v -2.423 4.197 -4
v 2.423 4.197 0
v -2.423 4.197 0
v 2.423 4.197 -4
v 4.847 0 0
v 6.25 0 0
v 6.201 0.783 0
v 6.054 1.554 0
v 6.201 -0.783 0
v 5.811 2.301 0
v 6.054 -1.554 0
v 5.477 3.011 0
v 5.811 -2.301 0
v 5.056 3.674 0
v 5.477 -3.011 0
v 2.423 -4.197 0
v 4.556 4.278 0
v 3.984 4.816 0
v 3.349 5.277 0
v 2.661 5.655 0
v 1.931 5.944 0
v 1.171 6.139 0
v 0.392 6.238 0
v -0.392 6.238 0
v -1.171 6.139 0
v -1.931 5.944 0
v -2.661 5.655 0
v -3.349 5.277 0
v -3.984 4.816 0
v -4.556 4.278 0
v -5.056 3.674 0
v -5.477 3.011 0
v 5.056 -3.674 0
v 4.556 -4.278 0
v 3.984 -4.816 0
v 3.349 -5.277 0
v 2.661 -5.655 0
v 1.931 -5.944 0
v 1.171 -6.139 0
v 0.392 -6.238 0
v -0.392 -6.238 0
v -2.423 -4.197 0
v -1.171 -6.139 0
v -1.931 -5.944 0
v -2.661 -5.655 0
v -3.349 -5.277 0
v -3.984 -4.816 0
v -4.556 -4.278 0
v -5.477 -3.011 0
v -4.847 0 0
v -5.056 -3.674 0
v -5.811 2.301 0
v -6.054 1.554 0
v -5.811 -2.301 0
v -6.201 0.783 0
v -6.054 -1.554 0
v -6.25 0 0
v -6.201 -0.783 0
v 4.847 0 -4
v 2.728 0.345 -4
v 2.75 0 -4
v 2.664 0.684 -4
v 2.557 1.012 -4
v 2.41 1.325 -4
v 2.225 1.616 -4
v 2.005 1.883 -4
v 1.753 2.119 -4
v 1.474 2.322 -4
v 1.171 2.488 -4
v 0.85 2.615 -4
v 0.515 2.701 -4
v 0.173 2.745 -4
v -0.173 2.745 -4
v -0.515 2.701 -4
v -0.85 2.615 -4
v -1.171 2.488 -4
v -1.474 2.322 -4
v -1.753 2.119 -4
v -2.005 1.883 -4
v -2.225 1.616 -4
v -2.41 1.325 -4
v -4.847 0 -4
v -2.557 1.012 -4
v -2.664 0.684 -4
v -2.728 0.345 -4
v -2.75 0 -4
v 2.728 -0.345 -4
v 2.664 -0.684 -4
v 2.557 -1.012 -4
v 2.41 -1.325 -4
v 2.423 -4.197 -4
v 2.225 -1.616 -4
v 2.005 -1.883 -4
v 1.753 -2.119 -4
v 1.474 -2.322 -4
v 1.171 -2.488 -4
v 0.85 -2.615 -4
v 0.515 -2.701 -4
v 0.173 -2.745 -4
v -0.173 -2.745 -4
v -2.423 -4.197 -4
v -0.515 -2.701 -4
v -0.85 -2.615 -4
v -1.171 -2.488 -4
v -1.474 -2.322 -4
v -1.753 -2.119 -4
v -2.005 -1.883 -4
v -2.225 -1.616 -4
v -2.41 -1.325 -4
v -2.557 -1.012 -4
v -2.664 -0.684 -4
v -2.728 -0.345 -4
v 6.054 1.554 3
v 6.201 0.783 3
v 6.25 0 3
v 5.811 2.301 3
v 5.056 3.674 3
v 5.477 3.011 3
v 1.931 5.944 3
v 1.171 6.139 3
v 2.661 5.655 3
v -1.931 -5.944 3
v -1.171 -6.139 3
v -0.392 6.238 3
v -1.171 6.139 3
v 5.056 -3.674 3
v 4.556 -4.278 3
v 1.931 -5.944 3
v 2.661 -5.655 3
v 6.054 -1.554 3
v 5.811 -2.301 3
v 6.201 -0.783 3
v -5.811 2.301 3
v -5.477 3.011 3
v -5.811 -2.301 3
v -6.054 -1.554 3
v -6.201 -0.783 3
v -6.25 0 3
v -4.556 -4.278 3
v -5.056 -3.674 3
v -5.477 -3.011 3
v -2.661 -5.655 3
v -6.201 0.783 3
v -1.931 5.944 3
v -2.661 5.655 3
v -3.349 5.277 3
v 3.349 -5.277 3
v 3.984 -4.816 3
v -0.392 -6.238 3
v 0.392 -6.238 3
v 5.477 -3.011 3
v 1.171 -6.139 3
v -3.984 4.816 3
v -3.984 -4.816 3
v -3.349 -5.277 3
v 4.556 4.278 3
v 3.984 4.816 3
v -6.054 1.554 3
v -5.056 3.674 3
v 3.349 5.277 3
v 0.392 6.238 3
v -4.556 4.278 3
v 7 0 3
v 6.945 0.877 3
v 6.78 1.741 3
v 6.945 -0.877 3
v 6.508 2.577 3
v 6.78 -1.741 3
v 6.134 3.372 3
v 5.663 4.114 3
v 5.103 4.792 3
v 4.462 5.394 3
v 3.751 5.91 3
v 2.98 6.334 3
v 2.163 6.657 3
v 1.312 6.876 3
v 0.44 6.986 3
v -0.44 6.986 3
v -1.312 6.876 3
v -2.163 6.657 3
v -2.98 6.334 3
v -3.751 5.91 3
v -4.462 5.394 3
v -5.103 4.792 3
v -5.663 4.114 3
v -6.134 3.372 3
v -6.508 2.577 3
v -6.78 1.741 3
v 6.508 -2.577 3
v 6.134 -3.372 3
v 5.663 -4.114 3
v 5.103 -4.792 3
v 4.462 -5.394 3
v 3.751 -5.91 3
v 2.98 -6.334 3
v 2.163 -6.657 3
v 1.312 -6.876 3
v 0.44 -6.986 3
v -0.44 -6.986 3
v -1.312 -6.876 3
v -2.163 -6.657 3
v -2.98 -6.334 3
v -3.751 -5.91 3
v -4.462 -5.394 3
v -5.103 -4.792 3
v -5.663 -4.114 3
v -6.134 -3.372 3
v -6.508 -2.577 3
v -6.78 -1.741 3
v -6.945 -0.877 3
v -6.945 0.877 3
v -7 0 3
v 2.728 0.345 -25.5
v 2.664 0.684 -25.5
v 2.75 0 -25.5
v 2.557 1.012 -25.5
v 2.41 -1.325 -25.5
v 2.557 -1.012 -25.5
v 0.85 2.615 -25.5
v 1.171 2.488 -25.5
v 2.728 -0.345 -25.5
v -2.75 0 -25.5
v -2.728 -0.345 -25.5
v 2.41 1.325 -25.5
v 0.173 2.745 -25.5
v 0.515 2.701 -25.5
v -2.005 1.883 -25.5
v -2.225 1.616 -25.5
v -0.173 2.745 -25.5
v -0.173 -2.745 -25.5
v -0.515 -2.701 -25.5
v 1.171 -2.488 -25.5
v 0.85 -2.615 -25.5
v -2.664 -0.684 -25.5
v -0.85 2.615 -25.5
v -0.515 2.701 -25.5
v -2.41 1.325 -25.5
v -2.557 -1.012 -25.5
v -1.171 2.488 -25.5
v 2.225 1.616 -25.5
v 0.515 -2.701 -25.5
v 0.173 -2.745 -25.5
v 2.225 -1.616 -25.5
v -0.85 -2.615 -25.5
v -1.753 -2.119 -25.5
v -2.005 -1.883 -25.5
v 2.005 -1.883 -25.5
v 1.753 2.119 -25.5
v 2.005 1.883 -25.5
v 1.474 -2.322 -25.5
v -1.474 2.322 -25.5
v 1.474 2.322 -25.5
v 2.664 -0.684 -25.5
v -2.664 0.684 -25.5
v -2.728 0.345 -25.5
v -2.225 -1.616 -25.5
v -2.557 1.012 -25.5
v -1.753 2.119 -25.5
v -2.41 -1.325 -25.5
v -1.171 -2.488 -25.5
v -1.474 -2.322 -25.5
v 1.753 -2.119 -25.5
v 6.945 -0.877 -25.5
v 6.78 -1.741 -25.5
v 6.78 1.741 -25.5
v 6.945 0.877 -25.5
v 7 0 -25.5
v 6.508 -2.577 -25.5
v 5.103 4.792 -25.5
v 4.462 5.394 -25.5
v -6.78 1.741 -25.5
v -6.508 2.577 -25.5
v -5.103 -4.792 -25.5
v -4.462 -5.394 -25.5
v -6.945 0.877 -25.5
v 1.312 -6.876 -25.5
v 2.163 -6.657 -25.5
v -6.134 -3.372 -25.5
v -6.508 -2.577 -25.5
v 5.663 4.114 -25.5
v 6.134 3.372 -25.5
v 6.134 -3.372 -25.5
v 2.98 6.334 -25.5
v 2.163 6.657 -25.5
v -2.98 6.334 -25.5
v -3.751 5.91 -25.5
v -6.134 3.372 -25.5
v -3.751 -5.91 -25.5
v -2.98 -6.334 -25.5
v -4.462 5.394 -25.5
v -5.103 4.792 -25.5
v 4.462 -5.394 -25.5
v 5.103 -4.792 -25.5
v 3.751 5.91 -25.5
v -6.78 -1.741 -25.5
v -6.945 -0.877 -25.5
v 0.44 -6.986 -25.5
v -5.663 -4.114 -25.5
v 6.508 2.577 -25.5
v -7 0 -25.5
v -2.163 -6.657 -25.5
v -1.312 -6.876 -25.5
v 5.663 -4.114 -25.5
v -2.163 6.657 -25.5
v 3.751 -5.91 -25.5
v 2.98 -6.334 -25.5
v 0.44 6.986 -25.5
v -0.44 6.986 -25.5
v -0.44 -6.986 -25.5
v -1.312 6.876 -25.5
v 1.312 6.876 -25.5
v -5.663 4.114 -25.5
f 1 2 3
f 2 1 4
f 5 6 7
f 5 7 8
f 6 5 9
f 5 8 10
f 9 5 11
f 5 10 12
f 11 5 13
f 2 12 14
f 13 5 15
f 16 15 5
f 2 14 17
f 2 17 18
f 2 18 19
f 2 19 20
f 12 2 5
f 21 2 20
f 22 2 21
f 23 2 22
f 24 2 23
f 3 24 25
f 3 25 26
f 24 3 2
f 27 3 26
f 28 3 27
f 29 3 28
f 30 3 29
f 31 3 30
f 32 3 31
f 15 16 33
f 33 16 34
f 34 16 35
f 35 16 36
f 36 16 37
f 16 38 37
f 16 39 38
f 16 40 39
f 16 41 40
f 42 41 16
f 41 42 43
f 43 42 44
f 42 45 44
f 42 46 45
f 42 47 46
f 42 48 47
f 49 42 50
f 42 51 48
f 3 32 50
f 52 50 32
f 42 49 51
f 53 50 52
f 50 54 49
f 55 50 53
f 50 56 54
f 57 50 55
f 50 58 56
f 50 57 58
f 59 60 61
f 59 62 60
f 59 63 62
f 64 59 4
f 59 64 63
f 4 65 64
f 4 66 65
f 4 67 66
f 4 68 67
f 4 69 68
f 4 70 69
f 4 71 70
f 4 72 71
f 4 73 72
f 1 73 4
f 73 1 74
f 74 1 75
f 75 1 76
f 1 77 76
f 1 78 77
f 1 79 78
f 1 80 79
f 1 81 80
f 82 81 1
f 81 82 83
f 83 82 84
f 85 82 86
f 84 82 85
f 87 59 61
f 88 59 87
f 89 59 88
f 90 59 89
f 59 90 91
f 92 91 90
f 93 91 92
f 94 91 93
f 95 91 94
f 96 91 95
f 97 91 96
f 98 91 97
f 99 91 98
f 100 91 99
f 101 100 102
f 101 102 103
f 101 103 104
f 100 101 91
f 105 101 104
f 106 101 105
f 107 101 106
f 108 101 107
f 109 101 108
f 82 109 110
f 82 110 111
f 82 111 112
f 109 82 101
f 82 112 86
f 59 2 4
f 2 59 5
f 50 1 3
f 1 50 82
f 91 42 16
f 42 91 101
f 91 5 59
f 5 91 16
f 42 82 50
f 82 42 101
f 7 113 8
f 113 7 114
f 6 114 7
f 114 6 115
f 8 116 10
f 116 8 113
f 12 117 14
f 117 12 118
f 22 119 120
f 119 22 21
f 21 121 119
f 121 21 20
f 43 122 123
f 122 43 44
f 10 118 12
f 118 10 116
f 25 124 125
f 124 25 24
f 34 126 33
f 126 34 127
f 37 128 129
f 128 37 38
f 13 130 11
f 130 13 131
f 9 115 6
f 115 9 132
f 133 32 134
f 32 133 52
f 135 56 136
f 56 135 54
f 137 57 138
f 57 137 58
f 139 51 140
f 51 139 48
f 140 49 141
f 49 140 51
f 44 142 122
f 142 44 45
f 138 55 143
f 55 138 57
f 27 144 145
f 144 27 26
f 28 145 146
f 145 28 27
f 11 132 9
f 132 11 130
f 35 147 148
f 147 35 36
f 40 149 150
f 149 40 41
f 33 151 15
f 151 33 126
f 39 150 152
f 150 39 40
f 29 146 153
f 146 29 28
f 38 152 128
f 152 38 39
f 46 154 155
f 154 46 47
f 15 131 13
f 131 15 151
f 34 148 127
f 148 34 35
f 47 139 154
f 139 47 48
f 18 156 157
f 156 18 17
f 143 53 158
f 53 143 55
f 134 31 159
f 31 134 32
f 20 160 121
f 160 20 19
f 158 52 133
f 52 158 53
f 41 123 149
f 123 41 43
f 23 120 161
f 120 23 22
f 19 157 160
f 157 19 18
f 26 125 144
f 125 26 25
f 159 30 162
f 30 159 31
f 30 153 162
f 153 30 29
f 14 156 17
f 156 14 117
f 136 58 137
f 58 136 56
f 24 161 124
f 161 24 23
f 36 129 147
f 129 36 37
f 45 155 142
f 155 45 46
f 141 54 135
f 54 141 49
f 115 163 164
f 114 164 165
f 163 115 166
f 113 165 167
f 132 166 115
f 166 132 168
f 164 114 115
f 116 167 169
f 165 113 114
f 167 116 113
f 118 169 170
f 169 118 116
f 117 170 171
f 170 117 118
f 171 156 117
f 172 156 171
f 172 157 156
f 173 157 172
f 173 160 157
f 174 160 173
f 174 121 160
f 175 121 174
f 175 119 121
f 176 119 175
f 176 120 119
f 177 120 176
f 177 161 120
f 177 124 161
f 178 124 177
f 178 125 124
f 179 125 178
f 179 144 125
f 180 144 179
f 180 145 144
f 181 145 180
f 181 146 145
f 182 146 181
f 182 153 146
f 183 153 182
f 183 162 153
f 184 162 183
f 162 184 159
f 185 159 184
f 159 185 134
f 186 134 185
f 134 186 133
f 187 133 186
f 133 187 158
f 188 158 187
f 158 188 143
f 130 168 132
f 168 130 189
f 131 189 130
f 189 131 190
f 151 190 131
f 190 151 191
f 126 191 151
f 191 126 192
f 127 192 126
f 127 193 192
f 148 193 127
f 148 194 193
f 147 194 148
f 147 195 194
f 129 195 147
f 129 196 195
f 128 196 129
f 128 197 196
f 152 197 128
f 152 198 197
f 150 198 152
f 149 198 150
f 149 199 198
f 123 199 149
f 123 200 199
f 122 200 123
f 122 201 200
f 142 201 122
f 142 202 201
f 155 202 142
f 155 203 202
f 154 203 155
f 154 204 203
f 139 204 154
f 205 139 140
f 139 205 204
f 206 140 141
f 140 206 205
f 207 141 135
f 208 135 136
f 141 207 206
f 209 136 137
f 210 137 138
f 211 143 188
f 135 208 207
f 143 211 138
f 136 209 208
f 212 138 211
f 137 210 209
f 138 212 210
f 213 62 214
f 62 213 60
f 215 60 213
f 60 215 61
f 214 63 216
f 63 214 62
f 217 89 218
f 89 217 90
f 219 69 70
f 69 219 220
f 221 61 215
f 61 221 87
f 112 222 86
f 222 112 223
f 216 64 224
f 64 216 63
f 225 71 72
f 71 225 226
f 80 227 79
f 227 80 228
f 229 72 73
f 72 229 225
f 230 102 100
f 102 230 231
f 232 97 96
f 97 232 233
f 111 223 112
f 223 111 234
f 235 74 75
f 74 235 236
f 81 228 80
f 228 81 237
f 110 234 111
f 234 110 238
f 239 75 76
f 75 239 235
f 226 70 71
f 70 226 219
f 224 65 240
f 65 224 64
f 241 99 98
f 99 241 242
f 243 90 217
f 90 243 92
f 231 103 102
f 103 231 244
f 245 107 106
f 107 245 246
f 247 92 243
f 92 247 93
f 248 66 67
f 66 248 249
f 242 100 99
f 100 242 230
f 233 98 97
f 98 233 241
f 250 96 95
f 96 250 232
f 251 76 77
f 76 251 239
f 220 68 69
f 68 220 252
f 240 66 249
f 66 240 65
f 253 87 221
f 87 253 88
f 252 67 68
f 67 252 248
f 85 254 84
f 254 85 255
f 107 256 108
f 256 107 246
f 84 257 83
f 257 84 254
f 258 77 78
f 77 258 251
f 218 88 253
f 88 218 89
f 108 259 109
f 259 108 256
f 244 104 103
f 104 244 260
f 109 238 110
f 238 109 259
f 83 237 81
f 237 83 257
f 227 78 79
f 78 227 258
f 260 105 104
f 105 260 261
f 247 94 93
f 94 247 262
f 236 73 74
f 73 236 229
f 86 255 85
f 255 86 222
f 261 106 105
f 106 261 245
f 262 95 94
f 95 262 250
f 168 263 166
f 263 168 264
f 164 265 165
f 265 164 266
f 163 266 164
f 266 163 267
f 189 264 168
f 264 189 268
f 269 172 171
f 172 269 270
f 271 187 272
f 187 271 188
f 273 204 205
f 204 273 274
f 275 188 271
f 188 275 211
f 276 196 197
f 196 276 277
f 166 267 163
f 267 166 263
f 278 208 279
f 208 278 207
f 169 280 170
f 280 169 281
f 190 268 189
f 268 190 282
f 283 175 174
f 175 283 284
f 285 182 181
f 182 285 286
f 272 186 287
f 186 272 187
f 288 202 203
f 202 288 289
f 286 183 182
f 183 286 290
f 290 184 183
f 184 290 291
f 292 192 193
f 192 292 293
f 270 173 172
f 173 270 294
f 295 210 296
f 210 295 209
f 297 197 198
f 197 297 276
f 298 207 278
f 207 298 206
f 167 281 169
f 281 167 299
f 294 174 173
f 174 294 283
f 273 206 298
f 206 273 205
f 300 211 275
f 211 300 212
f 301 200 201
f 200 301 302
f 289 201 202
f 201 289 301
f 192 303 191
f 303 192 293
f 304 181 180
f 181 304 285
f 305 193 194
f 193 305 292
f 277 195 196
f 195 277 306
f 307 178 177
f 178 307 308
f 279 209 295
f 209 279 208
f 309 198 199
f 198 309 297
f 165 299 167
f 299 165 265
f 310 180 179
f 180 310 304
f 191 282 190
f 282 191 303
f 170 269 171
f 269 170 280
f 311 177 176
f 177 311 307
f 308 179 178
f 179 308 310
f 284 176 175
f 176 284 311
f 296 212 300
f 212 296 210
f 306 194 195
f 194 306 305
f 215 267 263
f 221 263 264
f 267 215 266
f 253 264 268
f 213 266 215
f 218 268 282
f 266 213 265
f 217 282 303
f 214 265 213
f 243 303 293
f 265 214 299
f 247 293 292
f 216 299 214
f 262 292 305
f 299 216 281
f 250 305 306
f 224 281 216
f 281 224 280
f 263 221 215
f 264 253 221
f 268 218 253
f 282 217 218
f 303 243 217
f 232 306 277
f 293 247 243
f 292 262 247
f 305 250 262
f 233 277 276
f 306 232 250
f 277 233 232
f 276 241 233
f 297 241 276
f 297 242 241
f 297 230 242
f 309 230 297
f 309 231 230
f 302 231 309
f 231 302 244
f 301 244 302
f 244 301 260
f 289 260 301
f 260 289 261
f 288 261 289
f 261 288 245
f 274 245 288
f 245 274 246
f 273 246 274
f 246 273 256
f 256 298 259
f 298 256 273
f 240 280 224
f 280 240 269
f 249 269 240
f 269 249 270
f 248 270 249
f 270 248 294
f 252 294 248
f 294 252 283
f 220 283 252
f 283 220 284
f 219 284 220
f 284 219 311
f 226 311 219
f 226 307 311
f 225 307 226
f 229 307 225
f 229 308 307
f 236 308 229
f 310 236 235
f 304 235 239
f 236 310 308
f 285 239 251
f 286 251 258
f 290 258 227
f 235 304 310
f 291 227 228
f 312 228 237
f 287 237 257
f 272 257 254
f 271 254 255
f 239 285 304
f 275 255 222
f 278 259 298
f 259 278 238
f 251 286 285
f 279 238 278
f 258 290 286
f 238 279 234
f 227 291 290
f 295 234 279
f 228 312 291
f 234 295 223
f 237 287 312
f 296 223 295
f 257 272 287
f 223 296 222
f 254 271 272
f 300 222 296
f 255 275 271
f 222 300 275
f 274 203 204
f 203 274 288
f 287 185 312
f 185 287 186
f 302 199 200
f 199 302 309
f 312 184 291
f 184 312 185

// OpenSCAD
$fn = 50;


difference() {
	union() {
		translate(v = [0, 0, -25.5000000000]) {
			cylinder(h = 28.5000000000, r = 7.0000000000);
		}
	}
	union() {
		translate(v = [0, 0, 0]) {
			rotate(a = [0, 0, 0]) {
				difference() {
					union() {
						translate(v = [0, 0, -4]) {
							linear_extrude(height = 4) {
								polygon(points = [[4.8468000000, 0.0000000000], [2.4234000000, 4.1974519271], [-2.4234000000, 4.1974519271], [-4.8468000000, 0.0000000000], [-2.4234000000, -4.1974519271], [2.4234000000, -4.1974519271]]);
							}
						}
					}
					union();
				}
			}
		}
		#cylinder(h = 3, r = 6.2500000000);
		#translate(v = [0, 0, -100.0000000000]) {
			cylinder(h = 200, r = 2.7500000000);
		}
	}
}
